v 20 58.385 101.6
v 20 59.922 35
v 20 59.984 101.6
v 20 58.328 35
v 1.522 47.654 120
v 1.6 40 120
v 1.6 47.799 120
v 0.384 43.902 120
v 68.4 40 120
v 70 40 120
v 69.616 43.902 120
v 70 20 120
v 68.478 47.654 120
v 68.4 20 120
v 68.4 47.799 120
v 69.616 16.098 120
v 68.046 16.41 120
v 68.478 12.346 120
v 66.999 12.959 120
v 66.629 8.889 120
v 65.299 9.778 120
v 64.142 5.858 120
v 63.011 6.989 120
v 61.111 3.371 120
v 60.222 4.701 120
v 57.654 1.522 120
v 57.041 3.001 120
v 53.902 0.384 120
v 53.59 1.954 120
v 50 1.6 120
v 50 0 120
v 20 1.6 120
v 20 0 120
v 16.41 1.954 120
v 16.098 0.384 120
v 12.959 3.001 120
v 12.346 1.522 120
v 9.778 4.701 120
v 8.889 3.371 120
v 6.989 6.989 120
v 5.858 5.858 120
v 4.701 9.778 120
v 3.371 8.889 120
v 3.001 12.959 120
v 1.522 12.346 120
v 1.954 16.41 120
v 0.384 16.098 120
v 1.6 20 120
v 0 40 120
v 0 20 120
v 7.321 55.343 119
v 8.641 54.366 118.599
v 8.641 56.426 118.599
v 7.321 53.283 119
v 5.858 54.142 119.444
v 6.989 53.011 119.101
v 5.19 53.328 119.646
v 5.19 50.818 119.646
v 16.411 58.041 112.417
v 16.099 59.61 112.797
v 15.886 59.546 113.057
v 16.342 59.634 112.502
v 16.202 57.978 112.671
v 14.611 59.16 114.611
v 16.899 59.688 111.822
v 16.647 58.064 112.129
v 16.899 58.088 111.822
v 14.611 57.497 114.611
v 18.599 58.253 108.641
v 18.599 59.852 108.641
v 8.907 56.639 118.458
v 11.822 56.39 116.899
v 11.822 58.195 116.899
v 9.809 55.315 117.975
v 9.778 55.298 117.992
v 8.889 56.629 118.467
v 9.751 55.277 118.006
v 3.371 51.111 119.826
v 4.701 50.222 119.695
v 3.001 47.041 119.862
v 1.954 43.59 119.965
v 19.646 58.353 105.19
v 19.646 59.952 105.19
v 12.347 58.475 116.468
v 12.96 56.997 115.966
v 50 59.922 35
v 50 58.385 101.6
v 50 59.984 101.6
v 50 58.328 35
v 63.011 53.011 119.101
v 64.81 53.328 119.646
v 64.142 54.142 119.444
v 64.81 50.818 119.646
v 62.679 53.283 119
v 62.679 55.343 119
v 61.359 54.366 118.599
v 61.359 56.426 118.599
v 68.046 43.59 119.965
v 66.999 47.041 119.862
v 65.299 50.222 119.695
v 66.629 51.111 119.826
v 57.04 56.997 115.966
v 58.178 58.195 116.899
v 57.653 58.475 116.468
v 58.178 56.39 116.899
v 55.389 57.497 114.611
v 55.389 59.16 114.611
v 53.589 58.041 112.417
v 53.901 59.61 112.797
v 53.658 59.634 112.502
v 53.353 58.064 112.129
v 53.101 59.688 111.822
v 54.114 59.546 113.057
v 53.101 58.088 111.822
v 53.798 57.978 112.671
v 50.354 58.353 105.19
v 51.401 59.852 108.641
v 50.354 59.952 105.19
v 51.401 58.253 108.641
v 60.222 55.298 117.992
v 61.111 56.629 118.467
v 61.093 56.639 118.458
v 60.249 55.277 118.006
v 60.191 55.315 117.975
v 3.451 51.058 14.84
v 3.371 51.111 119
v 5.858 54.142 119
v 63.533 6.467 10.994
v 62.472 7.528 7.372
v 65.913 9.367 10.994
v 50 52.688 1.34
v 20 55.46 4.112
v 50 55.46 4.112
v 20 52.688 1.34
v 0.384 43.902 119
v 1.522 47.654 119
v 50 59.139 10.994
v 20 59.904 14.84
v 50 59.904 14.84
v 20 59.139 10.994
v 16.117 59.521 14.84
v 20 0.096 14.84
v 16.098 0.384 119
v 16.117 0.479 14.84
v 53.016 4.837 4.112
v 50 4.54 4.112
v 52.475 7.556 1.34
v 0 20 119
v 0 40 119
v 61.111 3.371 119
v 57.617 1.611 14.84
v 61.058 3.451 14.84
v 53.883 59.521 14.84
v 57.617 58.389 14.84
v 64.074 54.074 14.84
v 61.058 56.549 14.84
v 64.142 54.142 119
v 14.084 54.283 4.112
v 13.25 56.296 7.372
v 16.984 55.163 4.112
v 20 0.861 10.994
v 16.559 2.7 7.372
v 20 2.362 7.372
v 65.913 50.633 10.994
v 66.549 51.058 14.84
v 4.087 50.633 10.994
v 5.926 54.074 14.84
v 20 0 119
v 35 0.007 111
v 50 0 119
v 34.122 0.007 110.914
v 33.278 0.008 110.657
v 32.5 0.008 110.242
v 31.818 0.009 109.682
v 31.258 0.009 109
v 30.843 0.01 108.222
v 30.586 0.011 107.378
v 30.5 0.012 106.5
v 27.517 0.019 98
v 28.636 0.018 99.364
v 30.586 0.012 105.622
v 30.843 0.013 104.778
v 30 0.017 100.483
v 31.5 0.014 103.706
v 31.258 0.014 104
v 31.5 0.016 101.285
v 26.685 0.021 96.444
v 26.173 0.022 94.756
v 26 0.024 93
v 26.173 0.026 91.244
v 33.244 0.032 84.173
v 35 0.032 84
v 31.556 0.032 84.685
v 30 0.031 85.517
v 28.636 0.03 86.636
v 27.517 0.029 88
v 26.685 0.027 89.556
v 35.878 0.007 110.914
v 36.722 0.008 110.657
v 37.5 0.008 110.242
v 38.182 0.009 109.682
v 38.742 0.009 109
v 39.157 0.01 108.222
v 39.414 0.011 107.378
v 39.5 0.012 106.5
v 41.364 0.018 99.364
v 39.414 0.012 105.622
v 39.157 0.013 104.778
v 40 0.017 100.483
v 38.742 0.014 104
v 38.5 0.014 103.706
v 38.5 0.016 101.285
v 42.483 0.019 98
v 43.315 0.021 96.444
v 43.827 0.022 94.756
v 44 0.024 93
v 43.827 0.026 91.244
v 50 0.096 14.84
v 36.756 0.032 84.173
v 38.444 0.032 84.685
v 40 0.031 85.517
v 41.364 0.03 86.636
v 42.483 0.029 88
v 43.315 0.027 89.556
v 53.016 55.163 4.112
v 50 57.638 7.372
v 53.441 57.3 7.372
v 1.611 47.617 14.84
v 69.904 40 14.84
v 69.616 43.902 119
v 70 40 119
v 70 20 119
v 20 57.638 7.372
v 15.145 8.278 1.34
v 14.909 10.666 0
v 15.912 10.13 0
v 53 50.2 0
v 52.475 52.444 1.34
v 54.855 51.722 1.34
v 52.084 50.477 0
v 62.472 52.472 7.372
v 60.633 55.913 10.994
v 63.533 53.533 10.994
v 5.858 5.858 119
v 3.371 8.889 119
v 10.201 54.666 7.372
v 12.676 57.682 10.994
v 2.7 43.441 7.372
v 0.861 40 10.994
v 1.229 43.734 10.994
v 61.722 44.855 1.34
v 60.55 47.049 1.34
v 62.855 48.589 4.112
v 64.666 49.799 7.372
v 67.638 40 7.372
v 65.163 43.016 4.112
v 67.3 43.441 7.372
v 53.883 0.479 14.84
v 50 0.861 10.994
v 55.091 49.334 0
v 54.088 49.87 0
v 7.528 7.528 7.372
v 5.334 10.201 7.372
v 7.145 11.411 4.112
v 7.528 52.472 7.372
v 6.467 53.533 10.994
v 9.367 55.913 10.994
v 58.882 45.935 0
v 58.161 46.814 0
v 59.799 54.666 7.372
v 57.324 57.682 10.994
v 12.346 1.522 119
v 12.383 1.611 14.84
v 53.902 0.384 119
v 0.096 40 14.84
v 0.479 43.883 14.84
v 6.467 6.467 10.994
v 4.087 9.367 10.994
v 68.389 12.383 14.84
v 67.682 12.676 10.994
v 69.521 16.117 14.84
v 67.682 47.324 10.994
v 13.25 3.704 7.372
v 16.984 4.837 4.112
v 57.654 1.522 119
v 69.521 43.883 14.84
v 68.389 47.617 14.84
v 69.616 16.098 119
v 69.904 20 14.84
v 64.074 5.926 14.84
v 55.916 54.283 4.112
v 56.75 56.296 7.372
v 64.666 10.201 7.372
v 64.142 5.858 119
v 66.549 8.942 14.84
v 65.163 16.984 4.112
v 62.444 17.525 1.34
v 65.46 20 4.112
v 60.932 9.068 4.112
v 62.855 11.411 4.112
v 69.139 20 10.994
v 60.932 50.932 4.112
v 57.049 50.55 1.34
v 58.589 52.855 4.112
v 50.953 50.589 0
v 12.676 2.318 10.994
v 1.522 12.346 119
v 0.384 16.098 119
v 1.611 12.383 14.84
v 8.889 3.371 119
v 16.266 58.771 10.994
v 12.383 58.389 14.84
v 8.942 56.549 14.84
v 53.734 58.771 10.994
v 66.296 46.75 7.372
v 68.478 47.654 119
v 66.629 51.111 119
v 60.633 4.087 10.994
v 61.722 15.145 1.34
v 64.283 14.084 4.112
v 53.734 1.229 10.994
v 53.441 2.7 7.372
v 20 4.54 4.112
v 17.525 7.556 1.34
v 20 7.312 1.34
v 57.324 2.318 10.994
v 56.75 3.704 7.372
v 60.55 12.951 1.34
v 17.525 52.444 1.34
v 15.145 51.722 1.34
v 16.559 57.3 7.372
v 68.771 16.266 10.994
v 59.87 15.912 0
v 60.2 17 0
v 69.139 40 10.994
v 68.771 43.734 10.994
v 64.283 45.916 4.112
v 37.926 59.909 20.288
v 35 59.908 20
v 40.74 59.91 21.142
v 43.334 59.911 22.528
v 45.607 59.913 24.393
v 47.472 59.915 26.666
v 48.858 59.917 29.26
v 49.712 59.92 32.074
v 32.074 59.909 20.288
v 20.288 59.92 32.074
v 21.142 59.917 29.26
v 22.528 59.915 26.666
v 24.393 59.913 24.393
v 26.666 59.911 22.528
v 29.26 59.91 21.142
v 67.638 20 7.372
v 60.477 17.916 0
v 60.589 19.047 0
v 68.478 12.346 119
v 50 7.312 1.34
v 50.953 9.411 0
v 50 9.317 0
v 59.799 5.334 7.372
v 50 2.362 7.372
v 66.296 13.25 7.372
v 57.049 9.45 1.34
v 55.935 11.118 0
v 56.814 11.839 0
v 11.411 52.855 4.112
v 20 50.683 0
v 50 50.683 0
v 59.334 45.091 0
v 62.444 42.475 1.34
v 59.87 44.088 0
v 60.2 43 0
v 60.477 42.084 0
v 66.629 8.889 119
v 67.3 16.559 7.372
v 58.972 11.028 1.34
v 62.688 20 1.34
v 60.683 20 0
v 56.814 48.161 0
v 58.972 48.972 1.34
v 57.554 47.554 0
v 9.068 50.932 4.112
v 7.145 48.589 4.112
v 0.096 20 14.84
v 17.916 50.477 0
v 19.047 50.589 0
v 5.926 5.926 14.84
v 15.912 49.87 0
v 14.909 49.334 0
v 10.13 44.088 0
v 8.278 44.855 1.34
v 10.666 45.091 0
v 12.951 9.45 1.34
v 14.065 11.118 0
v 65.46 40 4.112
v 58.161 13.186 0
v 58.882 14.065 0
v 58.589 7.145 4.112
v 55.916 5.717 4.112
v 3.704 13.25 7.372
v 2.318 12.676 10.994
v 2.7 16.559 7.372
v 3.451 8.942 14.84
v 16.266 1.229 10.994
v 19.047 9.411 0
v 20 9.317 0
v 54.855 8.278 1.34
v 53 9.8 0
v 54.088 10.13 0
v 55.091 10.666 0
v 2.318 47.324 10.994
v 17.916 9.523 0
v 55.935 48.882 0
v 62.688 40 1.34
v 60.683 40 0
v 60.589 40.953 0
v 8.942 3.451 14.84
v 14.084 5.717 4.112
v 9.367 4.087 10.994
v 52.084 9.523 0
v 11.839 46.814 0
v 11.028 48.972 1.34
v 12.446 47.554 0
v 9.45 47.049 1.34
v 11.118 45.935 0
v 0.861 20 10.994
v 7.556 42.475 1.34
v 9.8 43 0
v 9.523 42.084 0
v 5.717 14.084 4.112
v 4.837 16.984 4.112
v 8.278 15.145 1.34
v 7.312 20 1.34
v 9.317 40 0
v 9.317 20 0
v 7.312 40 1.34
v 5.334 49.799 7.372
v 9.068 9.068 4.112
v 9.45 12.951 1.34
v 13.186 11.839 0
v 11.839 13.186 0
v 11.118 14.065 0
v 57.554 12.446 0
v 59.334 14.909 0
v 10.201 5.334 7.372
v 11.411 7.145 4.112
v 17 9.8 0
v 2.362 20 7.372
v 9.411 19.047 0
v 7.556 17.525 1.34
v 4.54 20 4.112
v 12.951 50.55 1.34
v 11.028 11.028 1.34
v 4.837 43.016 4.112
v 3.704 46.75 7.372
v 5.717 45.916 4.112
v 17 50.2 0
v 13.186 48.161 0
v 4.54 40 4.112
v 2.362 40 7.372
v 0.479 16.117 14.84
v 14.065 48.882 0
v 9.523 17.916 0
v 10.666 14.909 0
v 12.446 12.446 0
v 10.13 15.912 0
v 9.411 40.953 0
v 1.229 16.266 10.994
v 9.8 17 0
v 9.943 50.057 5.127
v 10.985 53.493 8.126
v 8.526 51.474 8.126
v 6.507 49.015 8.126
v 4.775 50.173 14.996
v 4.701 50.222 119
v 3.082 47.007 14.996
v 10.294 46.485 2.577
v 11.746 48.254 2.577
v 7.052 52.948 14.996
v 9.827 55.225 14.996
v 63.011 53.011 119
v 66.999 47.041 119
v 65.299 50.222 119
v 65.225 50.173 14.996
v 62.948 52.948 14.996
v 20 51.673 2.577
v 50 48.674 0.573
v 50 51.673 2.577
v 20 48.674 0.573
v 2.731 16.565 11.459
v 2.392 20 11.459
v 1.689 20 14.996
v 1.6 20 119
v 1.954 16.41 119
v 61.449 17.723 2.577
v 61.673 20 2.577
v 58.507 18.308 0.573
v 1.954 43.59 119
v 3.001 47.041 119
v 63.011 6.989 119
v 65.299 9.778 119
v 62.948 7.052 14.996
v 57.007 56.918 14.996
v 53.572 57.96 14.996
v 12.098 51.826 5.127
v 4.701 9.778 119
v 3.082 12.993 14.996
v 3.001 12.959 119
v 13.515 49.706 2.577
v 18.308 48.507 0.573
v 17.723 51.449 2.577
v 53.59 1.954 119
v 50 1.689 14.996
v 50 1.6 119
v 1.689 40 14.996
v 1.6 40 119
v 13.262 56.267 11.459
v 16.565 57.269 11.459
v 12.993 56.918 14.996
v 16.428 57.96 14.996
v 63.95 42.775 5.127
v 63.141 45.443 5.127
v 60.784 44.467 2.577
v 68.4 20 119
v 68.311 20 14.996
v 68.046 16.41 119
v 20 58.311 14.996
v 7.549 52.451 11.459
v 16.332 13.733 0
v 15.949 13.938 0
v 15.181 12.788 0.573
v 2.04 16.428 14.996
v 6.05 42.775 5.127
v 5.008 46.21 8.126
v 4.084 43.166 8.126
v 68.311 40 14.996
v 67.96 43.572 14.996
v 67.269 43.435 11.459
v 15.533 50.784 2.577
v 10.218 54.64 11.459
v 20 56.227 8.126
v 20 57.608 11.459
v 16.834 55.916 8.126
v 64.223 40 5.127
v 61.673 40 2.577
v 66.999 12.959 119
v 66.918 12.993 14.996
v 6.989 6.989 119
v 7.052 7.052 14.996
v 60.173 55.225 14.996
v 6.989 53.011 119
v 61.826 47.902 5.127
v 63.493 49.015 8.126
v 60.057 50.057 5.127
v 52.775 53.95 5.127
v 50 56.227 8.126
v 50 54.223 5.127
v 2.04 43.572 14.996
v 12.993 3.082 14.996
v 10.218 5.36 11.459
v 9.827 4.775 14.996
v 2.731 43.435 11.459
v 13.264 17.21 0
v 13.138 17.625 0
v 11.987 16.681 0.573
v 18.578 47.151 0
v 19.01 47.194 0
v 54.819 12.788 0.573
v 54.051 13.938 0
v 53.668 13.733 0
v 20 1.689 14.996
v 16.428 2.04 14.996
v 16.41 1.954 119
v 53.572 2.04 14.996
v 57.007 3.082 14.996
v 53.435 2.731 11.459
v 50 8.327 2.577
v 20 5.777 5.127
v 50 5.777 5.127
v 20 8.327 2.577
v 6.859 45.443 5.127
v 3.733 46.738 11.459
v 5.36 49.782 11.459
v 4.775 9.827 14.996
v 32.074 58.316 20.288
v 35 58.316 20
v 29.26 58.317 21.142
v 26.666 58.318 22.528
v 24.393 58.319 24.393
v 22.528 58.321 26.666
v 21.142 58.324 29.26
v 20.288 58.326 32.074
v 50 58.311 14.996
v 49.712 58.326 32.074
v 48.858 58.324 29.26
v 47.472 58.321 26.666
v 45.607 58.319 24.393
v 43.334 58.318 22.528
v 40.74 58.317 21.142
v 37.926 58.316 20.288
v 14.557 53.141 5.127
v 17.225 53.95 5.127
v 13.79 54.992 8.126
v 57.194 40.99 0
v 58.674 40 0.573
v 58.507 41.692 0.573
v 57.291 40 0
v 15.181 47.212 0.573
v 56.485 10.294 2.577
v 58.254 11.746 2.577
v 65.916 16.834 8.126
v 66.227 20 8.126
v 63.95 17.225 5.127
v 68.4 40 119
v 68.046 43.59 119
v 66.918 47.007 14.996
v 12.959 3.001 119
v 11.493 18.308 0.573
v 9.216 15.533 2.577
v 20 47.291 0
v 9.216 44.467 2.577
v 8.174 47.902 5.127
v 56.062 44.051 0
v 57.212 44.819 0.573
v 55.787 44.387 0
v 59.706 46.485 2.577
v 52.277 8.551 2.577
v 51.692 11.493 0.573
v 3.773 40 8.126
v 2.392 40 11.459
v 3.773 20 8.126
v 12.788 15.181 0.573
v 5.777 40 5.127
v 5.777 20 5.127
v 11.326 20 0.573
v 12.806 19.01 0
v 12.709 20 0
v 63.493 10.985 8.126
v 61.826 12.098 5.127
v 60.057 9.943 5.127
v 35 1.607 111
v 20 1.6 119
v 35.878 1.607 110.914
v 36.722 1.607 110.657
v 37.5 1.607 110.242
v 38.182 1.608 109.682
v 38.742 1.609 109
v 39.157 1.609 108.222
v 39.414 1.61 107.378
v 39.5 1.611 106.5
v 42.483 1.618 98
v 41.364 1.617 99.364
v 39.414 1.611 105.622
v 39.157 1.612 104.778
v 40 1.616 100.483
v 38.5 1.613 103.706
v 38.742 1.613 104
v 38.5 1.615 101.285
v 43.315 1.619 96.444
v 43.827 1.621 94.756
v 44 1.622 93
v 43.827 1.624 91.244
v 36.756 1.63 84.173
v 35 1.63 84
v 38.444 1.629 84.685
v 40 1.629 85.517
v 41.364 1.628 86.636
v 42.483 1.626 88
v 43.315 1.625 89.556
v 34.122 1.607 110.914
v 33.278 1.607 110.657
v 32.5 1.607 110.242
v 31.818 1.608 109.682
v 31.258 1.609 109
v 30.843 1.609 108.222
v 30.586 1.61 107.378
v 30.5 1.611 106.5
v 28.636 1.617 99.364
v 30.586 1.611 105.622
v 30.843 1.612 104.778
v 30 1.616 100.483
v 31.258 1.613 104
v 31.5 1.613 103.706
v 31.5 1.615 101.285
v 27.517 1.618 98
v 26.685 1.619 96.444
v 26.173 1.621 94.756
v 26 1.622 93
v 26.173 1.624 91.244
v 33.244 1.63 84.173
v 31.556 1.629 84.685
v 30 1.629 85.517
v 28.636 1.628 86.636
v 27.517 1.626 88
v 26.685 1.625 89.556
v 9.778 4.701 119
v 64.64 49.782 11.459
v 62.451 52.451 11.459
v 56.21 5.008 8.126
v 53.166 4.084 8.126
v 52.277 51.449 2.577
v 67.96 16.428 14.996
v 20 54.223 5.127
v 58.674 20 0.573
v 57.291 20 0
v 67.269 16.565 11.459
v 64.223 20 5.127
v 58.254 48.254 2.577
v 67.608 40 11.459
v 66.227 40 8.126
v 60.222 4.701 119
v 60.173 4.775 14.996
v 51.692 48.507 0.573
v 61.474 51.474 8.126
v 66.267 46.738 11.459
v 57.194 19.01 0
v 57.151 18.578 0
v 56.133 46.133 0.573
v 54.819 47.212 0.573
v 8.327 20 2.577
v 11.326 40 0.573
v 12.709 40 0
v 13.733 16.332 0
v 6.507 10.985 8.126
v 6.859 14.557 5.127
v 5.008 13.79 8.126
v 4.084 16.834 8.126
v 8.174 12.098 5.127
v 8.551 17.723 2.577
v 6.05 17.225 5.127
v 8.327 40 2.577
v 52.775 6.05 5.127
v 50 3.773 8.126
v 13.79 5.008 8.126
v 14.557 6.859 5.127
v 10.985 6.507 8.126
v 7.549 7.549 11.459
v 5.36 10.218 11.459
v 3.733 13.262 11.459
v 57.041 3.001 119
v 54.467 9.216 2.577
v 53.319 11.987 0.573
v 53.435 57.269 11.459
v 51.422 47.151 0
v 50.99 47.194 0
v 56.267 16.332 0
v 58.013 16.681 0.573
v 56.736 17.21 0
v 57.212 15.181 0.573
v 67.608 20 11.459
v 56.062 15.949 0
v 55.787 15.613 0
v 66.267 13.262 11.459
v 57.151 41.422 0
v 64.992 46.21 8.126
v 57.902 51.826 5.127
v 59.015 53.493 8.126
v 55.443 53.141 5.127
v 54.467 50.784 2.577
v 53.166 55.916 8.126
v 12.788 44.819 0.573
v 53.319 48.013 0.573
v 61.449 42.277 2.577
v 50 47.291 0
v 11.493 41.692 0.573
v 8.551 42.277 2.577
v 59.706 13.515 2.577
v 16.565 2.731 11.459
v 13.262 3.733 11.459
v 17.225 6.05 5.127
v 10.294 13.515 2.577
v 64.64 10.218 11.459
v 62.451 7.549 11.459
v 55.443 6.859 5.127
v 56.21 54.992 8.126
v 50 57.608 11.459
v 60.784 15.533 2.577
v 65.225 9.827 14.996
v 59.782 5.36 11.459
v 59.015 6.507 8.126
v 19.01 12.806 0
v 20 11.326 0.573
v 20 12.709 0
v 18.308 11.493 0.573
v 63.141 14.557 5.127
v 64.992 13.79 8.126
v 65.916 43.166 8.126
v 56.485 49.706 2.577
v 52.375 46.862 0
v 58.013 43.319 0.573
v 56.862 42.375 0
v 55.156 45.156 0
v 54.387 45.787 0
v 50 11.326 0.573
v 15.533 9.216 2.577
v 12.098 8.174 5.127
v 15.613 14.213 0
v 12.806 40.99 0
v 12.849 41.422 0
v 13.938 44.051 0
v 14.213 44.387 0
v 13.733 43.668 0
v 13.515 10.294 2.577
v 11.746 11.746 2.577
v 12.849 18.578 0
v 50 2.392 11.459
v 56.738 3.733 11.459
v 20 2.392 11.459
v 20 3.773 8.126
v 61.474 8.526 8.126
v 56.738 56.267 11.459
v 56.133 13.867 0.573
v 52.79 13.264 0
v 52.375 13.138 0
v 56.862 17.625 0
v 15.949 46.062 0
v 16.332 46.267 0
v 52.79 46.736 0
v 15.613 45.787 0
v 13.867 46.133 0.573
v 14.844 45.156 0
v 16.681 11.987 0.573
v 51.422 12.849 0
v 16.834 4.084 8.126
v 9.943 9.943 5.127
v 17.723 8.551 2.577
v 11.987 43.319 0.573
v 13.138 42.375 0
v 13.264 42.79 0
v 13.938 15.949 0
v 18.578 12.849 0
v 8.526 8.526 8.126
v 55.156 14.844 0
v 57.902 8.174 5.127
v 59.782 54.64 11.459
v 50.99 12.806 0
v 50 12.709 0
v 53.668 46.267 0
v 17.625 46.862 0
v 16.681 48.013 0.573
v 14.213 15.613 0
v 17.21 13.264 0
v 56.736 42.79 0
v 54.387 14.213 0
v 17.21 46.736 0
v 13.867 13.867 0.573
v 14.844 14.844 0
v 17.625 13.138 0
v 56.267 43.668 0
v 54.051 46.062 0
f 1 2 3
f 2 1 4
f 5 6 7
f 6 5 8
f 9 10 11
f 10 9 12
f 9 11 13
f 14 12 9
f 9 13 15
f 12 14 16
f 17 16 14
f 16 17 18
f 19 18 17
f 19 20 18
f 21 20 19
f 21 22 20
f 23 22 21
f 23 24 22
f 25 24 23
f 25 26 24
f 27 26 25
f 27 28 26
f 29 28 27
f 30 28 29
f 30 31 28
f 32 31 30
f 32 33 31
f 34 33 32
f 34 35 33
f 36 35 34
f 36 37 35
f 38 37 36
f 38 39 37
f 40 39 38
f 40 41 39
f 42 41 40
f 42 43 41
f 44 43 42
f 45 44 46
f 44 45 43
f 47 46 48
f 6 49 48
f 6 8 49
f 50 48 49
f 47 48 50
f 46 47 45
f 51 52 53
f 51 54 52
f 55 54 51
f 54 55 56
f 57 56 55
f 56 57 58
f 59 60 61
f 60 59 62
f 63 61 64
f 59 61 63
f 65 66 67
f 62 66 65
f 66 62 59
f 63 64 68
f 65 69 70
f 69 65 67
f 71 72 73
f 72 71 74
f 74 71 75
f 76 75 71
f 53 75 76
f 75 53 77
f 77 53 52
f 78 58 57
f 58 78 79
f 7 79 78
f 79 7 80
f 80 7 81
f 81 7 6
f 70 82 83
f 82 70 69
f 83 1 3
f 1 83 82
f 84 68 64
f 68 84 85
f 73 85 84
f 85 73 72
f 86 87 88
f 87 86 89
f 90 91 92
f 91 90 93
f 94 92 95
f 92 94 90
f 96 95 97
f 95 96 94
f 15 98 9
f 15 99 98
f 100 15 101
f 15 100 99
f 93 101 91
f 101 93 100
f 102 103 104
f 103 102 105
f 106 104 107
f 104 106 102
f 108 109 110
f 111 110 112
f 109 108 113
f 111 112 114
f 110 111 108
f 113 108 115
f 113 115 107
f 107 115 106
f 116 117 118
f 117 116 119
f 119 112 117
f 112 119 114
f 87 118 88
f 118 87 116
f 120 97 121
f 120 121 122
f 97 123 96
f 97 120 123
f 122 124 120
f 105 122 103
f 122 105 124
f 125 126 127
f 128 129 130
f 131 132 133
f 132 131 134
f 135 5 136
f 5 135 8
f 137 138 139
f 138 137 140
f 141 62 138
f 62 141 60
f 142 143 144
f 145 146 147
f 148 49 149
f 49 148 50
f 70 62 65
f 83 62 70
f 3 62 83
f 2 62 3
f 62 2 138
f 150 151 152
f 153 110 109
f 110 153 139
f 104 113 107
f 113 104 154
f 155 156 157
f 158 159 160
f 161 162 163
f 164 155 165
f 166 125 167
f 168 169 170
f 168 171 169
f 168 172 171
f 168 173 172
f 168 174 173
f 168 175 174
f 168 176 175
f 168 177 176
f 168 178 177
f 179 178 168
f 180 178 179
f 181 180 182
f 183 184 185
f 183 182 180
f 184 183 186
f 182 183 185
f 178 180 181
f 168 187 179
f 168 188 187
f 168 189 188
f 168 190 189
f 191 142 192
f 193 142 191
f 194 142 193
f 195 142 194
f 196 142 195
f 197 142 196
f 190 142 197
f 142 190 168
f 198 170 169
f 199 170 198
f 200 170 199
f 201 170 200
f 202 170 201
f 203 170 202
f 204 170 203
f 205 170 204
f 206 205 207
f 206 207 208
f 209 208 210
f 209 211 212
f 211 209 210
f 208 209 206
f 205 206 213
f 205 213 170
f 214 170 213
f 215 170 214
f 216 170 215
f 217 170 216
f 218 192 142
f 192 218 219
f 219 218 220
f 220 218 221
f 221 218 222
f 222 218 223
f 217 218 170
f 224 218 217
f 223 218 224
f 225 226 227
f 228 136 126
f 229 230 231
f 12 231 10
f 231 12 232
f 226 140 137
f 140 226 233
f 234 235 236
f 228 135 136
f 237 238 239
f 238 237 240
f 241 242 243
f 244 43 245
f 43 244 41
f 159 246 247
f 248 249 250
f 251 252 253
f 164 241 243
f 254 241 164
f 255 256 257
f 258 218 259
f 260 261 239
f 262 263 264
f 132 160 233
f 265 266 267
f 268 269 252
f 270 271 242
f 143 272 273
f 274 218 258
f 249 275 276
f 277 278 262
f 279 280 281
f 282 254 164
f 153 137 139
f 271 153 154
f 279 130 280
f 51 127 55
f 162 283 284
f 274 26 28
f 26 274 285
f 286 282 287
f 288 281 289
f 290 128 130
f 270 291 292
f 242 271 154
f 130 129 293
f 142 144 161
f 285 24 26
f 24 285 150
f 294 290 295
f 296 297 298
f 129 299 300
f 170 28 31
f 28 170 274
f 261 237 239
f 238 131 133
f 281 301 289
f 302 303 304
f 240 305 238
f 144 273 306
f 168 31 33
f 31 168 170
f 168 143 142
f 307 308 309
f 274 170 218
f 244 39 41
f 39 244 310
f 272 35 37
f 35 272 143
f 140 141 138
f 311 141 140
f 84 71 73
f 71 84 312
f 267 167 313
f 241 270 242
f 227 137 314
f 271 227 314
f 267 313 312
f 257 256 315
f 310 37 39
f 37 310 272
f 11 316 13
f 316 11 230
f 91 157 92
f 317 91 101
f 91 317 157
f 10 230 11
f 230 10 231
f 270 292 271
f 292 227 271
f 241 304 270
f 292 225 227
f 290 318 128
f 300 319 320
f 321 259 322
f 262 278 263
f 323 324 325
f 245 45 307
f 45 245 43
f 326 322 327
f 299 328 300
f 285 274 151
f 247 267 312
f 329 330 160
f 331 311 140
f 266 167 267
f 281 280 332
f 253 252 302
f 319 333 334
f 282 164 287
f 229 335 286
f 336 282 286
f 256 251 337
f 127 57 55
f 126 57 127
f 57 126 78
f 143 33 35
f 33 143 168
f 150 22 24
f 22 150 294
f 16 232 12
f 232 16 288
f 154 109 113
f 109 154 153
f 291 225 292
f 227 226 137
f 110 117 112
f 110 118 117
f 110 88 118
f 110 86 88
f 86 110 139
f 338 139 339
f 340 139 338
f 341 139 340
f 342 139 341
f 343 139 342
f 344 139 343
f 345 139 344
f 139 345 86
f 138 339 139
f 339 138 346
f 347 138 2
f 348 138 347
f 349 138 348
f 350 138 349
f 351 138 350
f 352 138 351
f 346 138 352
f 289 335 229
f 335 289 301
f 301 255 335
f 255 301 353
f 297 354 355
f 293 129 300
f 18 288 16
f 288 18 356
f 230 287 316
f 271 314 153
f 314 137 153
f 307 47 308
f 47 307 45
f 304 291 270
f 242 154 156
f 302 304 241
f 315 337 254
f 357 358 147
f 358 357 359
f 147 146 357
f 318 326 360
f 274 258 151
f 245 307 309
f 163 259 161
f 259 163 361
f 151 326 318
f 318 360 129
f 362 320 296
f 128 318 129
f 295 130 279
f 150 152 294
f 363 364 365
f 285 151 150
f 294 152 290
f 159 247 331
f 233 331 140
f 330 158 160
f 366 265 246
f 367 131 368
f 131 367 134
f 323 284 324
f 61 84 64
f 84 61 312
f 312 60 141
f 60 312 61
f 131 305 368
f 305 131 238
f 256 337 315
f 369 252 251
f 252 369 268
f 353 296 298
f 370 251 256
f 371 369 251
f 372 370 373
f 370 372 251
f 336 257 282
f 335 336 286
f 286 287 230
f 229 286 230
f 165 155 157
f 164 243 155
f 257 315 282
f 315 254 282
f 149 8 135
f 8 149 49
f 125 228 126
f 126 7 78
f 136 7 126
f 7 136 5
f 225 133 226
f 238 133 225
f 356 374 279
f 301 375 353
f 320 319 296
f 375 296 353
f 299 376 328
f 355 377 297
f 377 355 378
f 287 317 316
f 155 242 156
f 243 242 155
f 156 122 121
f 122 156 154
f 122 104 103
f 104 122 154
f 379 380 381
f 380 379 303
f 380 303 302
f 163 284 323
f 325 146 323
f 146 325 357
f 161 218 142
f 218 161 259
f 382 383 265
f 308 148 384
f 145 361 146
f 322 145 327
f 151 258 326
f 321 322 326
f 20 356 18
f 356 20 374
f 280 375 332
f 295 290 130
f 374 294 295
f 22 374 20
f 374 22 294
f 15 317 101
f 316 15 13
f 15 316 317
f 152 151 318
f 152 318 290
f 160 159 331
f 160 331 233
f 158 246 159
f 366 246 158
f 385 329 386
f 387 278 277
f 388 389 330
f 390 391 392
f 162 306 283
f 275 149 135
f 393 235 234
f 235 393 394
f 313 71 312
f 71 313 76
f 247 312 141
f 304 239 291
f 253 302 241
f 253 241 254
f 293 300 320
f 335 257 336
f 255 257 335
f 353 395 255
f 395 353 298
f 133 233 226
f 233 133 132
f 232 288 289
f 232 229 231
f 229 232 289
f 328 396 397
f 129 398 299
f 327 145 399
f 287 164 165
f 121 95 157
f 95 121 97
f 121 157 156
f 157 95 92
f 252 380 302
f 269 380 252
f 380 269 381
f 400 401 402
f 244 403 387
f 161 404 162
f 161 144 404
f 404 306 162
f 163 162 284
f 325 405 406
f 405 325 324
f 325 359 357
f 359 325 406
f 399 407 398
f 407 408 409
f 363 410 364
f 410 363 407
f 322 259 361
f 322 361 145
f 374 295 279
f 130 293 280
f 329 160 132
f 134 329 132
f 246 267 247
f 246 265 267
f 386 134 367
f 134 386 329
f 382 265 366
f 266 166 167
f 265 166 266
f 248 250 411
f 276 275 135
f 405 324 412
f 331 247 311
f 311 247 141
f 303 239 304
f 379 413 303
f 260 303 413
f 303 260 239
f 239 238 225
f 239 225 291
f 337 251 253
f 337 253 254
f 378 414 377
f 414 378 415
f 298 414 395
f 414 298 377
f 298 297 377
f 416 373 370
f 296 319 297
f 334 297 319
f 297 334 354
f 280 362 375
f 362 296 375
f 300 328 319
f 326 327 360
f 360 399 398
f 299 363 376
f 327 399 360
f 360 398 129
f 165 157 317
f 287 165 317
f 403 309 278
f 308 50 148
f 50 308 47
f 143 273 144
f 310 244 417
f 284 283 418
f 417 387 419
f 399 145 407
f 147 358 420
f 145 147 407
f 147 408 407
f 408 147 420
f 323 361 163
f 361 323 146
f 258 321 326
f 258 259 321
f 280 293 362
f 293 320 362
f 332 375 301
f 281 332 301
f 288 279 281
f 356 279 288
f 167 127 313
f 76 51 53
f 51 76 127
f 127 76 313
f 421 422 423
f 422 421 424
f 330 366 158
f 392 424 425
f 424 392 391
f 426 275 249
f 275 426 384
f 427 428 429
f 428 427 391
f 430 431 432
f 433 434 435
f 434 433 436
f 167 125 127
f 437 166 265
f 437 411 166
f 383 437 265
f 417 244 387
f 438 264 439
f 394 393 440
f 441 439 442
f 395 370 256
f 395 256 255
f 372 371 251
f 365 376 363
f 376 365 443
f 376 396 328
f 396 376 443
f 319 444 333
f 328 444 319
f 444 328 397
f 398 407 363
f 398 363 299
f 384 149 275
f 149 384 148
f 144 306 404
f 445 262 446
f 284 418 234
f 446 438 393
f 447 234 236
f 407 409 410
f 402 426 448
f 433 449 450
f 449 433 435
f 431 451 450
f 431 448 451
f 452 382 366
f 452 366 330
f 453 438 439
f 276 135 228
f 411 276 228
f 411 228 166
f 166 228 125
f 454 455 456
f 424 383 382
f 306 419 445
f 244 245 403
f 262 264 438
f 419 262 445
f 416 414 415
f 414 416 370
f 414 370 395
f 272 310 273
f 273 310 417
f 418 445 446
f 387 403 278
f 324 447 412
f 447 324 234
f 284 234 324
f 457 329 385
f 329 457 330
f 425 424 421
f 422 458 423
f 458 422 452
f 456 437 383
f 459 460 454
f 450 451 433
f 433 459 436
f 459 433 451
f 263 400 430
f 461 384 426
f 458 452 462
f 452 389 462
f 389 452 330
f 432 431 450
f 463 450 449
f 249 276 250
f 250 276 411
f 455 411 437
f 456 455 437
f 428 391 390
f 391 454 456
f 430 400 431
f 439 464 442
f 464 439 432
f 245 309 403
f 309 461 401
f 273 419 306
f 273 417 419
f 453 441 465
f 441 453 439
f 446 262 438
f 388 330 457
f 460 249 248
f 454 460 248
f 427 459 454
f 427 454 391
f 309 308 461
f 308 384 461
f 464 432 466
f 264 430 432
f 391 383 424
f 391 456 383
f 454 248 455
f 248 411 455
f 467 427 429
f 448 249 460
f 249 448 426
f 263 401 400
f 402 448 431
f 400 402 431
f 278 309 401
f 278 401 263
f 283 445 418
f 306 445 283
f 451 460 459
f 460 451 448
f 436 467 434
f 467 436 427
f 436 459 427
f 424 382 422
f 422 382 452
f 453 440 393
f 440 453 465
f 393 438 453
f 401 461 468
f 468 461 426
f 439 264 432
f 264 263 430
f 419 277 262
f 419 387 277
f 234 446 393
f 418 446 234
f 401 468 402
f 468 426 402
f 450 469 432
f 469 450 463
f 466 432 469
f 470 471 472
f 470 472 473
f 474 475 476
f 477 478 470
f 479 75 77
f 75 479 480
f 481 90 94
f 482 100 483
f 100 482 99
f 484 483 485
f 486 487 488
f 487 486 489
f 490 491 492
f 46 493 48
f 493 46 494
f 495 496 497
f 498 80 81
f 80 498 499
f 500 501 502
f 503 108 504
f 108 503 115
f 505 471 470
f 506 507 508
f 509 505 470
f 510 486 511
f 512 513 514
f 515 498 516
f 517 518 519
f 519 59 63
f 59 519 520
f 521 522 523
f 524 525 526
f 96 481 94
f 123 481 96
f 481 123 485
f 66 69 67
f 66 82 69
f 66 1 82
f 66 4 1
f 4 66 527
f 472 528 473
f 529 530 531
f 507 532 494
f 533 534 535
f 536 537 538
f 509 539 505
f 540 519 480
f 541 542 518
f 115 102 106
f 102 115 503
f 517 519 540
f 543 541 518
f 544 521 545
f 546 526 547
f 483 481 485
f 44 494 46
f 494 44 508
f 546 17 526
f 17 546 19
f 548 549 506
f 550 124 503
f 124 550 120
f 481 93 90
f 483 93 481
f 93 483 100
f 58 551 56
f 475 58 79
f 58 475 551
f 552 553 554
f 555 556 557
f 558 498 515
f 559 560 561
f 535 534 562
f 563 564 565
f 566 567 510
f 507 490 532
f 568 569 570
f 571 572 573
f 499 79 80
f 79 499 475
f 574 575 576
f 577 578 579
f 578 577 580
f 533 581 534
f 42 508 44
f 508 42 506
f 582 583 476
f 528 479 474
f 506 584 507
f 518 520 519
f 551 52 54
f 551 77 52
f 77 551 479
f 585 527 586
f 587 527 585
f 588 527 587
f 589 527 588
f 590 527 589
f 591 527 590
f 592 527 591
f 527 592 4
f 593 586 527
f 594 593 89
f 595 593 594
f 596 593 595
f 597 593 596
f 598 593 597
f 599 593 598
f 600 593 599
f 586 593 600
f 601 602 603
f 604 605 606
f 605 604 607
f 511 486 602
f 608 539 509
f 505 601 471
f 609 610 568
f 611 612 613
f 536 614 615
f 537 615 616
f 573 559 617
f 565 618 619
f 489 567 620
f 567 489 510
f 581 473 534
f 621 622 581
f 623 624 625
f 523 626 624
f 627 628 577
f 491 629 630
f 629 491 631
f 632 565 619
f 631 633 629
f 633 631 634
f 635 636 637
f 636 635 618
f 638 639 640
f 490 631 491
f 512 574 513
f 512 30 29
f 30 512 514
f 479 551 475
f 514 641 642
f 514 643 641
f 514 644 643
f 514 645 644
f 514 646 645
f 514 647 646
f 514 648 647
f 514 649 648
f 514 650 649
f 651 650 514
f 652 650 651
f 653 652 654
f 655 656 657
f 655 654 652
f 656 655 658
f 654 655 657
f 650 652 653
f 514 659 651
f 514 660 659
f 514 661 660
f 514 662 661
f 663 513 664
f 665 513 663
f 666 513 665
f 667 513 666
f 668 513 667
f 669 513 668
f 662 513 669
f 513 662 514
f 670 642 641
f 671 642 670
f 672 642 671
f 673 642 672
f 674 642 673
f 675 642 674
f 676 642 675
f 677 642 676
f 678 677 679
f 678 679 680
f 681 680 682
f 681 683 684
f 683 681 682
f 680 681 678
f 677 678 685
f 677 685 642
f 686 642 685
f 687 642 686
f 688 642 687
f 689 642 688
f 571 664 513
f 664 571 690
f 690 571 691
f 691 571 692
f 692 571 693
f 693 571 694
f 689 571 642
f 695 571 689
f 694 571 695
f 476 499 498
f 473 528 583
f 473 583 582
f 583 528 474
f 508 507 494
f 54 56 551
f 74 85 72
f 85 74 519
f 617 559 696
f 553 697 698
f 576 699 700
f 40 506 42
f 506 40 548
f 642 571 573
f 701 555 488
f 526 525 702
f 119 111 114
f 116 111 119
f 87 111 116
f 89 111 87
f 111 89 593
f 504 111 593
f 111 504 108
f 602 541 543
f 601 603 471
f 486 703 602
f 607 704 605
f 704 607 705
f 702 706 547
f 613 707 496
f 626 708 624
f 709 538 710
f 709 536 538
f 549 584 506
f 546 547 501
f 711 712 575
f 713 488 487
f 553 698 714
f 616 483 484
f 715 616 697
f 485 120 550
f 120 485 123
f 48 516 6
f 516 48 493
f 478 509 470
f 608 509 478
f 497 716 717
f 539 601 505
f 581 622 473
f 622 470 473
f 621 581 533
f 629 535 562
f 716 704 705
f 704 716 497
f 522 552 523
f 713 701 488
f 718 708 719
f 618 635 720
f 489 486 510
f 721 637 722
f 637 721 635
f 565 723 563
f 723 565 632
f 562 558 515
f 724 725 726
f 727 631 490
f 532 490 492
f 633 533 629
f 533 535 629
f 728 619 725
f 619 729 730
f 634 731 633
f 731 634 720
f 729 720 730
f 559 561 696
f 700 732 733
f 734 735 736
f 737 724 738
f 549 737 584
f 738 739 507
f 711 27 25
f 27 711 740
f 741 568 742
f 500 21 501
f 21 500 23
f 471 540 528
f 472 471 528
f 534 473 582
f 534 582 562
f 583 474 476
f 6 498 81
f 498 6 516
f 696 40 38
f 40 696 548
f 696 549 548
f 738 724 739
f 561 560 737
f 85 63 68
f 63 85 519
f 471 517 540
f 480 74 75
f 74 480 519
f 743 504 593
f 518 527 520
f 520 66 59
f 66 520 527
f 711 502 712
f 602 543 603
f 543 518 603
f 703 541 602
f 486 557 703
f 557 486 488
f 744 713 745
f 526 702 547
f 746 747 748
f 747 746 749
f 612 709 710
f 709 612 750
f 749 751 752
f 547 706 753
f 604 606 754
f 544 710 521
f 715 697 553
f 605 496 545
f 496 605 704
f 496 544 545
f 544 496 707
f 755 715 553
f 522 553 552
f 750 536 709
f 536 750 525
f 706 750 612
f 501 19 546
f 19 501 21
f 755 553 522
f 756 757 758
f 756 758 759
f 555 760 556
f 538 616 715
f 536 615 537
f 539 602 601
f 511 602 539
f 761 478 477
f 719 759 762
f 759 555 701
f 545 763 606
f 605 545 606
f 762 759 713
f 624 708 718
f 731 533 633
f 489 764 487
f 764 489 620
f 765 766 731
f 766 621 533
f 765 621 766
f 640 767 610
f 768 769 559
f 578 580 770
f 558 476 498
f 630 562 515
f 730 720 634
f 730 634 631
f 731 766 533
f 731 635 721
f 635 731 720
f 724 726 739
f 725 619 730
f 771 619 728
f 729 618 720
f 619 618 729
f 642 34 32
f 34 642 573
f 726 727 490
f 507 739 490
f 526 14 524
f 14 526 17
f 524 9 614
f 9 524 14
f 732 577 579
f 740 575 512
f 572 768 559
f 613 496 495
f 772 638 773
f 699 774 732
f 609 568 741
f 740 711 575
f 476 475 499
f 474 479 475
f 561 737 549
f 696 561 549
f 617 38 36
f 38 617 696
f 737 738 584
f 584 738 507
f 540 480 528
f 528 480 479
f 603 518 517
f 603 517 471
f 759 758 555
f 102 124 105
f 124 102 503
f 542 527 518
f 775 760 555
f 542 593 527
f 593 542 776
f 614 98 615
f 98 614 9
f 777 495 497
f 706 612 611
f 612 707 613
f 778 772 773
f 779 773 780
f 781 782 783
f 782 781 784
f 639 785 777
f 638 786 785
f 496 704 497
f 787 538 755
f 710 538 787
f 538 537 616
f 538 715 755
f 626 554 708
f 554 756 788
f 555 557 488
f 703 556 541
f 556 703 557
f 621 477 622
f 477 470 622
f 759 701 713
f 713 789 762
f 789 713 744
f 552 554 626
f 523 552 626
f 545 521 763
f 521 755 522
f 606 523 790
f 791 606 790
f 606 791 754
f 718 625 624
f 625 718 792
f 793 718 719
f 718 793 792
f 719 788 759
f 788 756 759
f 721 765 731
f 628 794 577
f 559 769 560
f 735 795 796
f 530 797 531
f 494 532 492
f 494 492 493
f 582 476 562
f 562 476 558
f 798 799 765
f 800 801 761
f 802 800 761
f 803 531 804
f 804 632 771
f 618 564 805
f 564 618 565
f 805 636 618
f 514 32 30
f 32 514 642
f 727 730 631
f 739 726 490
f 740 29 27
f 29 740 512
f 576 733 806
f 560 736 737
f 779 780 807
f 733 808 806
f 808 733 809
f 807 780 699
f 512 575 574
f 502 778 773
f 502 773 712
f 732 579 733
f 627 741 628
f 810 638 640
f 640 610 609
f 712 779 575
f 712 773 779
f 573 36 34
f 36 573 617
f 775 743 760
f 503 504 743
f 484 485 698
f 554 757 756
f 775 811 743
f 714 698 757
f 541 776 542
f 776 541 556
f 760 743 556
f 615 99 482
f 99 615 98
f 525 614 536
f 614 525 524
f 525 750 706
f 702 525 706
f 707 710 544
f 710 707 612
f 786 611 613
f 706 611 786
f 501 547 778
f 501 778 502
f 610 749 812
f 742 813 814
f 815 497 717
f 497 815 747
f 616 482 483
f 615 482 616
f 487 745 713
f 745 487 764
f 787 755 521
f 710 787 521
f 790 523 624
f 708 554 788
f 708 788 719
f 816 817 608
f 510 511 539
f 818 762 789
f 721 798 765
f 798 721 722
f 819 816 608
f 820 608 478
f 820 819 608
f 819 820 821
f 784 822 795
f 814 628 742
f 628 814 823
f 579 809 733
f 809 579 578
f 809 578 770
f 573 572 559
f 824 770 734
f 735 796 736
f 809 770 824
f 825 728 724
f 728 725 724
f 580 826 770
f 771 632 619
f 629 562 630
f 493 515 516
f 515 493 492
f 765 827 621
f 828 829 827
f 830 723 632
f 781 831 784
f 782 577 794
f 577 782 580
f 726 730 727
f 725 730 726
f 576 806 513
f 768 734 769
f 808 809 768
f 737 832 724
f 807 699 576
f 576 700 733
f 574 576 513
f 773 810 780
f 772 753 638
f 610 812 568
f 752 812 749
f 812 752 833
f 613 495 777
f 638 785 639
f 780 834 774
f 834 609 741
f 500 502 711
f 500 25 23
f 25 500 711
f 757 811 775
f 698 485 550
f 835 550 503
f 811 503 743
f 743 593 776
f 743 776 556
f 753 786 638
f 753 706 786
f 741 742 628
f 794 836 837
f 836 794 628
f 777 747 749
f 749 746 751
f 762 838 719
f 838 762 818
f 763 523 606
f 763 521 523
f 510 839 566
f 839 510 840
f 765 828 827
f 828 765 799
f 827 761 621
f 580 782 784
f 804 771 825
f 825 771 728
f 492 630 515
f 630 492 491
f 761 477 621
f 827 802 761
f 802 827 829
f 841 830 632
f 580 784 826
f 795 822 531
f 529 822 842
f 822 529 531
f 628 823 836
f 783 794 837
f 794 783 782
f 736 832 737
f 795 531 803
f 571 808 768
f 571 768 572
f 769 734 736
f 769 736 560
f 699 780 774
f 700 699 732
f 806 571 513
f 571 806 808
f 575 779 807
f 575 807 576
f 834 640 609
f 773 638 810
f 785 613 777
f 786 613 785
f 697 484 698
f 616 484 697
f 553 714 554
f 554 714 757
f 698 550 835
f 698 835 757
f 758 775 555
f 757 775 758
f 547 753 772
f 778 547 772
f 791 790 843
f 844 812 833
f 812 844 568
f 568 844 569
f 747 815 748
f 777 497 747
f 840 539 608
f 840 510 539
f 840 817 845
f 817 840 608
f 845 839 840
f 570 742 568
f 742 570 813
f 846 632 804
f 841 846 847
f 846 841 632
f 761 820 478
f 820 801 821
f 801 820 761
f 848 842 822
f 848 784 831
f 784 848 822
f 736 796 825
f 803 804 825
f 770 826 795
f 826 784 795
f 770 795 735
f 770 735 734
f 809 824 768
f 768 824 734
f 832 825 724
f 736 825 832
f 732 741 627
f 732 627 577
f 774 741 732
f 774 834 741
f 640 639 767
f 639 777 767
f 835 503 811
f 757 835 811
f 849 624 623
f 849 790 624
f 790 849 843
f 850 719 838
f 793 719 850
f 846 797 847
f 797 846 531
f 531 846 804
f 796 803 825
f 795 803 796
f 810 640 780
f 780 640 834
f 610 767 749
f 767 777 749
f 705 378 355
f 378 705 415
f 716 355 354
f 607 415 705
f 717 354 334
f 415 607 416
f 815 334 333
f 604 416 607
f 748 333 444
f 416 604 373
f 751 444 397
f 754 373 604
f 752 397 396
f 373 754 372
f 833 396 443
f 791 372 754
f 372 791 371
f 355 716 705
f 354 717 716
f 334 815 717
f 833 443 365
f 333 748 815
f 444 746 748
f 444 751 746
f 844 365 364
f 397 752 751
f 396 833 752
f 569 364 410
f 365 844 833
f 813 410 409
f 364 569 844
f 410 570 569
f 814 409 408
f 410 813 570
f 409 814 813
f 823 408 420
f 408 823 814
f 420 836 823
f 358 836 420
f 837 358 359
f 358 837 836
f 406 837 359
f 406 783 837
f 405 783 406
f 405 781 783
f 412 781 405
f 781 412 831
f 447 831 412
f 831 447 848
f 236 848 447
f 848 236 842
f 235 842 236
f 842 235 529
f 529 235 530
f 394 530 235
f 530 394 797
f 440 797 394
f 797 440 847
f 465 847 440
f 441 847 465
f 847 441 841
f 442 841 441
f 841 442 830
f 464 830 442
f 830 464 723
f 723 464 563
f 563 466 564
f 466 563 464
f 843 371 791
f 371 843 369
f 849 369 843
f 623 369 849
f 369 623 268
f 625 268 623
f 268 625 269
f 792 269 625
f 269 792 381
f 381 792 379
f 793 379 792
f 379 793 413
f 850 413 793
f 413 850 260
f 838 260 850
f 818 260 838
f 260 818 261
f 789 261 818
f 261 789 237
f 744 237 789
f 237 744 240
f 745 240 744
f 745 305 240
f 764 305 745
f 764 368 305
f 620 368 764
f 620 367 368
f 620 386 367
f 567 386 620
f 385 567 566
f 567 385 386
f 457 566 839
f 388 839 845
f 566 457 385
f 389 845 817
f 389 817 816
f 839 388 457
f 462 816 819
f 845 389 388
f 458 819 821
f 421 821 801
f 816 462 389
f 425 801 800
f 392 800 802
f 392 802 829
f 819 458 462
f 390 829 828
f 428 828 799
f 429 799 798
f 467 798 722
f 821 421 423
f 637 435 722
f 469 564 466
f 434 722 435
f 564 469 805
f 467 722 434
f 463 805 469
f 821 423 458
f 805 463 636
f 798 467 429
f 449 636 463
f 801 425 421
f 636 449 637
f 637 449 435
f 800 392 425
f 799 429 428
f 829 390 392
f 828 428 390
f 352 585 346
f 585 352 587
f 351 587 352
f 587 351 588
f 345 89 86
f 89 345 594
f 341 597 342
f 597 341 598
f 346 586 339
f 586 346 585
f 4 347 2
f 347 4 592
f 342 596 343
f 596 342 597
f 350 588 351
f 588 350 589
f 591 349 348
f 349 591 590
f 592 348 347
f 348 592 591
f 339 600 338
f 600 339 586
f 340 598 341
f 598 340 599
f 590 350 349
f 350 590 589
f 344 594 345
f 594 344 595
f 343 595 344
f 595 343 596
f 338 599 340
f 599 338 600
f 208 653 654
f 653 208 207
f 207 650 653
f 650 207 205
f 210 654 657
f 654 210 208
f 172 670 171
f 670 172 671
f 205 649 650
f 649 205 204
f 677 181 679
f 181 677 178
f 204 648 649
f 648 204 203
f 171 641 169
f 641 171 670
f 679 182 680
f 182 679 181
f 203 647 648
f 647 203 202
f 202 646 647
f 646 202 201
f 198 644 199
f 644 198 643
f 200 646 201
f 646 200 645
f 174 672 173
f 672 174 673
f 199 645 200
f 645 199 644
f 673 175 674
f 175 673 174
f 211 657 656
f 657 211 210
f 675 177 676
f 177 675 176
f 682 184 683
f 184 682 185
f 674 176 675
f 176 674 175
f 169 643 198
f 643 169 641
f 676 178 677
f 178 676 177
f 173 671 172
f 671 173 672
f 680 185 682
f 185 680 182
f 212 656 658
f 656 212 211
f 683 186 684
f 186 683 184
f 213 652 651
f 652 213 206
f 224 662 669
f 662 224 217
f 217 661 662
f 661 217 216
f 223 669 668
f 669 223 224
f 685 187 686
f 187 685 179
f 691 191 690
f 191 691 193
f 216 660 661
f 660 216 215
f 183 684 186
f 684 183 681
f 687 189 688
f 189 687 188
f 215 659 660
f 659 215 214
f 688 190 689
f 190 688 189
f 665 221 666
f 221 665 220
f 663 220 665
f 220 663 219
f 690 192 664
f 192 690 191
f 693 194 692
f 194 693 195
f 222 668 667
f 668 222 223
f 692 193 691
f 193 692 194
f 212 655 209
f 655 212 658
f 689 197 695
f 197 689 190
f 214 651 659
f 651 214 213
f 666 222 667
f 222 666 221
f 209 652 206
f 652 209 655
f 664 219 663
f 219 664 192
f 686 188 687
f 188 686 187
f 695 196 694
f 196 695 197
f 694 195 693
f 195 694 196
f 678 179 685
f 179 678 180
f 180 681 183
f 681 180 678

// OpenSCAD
thick = 1.6;
W = 70;
D = 60;
H = 120;
R = 20;
suckerRin = 4.5;
suckerRout = 9;

difference() {
    base(0);
    base(thick);
    translate([0, 0, -thick * 2])
        cube([W, D, thick * 2]);
    hull() {
        translate([W / 2, D / 2, R + (W - R * 2) / 2])
            rotate([-90, 0, 0])
                cylinder(r = (W - R * 2) / 2, h = D / 2, $fn = 32);
        translate([R, D / 2, H - 1])
            cube([W - R * 2, D / 2, 1]);
    }
    difference() {
        translate([thick, D / 2, H - (R - thick)])
            cube([R - thick, D / 2, R - thick]);
        translate([thick, 0, H - (R - thick)])
            rotate([-90, 0, 0])
                cylinder(r = R - thick, h = D, $fn = 32);
    }
    difference() {
        translate([W - R, D / 2, H - (R - thick)])
            cube([R - thick, D / 2, R - thick]);
        translate([W - thick, 0, H - (R - thick)])
            rotate([-90, 0, 0])
                cylinder(r = R - thick, h = D, $fn = 32);
    }

    translate([W / 2, 0, H - suckerRout * 1.5])
        rotate([-90, 0, 0])
            cylinder(r = suckerRin, h = D / 2, $fn = 32);
    translate([W / 2 - (suckerRin - 1), 0, H - suckerRout * 3])
        cube([(suckerRin -1) * 2, D / 2, suckerRout * 1.5]);
    translate([W / 2, 0, H - suckerRout * 3])
        rotate([-90, 0, 0])
            cylinder(r = suckerRout, h = D / 2, $fn = 32);
}

module base(delta) {
    hull() {
        for (x = [R, W - R]) {
            for (y = [R, D - R]) {
                translate([x, y, R - thick * 2])
                    sphere(r = R - delta, $fn = 32);
                translate([x, y, H - 1])
                    cylinder(r = R - delta, h = 1, $fn = 32);
            }
        }
    }
}
